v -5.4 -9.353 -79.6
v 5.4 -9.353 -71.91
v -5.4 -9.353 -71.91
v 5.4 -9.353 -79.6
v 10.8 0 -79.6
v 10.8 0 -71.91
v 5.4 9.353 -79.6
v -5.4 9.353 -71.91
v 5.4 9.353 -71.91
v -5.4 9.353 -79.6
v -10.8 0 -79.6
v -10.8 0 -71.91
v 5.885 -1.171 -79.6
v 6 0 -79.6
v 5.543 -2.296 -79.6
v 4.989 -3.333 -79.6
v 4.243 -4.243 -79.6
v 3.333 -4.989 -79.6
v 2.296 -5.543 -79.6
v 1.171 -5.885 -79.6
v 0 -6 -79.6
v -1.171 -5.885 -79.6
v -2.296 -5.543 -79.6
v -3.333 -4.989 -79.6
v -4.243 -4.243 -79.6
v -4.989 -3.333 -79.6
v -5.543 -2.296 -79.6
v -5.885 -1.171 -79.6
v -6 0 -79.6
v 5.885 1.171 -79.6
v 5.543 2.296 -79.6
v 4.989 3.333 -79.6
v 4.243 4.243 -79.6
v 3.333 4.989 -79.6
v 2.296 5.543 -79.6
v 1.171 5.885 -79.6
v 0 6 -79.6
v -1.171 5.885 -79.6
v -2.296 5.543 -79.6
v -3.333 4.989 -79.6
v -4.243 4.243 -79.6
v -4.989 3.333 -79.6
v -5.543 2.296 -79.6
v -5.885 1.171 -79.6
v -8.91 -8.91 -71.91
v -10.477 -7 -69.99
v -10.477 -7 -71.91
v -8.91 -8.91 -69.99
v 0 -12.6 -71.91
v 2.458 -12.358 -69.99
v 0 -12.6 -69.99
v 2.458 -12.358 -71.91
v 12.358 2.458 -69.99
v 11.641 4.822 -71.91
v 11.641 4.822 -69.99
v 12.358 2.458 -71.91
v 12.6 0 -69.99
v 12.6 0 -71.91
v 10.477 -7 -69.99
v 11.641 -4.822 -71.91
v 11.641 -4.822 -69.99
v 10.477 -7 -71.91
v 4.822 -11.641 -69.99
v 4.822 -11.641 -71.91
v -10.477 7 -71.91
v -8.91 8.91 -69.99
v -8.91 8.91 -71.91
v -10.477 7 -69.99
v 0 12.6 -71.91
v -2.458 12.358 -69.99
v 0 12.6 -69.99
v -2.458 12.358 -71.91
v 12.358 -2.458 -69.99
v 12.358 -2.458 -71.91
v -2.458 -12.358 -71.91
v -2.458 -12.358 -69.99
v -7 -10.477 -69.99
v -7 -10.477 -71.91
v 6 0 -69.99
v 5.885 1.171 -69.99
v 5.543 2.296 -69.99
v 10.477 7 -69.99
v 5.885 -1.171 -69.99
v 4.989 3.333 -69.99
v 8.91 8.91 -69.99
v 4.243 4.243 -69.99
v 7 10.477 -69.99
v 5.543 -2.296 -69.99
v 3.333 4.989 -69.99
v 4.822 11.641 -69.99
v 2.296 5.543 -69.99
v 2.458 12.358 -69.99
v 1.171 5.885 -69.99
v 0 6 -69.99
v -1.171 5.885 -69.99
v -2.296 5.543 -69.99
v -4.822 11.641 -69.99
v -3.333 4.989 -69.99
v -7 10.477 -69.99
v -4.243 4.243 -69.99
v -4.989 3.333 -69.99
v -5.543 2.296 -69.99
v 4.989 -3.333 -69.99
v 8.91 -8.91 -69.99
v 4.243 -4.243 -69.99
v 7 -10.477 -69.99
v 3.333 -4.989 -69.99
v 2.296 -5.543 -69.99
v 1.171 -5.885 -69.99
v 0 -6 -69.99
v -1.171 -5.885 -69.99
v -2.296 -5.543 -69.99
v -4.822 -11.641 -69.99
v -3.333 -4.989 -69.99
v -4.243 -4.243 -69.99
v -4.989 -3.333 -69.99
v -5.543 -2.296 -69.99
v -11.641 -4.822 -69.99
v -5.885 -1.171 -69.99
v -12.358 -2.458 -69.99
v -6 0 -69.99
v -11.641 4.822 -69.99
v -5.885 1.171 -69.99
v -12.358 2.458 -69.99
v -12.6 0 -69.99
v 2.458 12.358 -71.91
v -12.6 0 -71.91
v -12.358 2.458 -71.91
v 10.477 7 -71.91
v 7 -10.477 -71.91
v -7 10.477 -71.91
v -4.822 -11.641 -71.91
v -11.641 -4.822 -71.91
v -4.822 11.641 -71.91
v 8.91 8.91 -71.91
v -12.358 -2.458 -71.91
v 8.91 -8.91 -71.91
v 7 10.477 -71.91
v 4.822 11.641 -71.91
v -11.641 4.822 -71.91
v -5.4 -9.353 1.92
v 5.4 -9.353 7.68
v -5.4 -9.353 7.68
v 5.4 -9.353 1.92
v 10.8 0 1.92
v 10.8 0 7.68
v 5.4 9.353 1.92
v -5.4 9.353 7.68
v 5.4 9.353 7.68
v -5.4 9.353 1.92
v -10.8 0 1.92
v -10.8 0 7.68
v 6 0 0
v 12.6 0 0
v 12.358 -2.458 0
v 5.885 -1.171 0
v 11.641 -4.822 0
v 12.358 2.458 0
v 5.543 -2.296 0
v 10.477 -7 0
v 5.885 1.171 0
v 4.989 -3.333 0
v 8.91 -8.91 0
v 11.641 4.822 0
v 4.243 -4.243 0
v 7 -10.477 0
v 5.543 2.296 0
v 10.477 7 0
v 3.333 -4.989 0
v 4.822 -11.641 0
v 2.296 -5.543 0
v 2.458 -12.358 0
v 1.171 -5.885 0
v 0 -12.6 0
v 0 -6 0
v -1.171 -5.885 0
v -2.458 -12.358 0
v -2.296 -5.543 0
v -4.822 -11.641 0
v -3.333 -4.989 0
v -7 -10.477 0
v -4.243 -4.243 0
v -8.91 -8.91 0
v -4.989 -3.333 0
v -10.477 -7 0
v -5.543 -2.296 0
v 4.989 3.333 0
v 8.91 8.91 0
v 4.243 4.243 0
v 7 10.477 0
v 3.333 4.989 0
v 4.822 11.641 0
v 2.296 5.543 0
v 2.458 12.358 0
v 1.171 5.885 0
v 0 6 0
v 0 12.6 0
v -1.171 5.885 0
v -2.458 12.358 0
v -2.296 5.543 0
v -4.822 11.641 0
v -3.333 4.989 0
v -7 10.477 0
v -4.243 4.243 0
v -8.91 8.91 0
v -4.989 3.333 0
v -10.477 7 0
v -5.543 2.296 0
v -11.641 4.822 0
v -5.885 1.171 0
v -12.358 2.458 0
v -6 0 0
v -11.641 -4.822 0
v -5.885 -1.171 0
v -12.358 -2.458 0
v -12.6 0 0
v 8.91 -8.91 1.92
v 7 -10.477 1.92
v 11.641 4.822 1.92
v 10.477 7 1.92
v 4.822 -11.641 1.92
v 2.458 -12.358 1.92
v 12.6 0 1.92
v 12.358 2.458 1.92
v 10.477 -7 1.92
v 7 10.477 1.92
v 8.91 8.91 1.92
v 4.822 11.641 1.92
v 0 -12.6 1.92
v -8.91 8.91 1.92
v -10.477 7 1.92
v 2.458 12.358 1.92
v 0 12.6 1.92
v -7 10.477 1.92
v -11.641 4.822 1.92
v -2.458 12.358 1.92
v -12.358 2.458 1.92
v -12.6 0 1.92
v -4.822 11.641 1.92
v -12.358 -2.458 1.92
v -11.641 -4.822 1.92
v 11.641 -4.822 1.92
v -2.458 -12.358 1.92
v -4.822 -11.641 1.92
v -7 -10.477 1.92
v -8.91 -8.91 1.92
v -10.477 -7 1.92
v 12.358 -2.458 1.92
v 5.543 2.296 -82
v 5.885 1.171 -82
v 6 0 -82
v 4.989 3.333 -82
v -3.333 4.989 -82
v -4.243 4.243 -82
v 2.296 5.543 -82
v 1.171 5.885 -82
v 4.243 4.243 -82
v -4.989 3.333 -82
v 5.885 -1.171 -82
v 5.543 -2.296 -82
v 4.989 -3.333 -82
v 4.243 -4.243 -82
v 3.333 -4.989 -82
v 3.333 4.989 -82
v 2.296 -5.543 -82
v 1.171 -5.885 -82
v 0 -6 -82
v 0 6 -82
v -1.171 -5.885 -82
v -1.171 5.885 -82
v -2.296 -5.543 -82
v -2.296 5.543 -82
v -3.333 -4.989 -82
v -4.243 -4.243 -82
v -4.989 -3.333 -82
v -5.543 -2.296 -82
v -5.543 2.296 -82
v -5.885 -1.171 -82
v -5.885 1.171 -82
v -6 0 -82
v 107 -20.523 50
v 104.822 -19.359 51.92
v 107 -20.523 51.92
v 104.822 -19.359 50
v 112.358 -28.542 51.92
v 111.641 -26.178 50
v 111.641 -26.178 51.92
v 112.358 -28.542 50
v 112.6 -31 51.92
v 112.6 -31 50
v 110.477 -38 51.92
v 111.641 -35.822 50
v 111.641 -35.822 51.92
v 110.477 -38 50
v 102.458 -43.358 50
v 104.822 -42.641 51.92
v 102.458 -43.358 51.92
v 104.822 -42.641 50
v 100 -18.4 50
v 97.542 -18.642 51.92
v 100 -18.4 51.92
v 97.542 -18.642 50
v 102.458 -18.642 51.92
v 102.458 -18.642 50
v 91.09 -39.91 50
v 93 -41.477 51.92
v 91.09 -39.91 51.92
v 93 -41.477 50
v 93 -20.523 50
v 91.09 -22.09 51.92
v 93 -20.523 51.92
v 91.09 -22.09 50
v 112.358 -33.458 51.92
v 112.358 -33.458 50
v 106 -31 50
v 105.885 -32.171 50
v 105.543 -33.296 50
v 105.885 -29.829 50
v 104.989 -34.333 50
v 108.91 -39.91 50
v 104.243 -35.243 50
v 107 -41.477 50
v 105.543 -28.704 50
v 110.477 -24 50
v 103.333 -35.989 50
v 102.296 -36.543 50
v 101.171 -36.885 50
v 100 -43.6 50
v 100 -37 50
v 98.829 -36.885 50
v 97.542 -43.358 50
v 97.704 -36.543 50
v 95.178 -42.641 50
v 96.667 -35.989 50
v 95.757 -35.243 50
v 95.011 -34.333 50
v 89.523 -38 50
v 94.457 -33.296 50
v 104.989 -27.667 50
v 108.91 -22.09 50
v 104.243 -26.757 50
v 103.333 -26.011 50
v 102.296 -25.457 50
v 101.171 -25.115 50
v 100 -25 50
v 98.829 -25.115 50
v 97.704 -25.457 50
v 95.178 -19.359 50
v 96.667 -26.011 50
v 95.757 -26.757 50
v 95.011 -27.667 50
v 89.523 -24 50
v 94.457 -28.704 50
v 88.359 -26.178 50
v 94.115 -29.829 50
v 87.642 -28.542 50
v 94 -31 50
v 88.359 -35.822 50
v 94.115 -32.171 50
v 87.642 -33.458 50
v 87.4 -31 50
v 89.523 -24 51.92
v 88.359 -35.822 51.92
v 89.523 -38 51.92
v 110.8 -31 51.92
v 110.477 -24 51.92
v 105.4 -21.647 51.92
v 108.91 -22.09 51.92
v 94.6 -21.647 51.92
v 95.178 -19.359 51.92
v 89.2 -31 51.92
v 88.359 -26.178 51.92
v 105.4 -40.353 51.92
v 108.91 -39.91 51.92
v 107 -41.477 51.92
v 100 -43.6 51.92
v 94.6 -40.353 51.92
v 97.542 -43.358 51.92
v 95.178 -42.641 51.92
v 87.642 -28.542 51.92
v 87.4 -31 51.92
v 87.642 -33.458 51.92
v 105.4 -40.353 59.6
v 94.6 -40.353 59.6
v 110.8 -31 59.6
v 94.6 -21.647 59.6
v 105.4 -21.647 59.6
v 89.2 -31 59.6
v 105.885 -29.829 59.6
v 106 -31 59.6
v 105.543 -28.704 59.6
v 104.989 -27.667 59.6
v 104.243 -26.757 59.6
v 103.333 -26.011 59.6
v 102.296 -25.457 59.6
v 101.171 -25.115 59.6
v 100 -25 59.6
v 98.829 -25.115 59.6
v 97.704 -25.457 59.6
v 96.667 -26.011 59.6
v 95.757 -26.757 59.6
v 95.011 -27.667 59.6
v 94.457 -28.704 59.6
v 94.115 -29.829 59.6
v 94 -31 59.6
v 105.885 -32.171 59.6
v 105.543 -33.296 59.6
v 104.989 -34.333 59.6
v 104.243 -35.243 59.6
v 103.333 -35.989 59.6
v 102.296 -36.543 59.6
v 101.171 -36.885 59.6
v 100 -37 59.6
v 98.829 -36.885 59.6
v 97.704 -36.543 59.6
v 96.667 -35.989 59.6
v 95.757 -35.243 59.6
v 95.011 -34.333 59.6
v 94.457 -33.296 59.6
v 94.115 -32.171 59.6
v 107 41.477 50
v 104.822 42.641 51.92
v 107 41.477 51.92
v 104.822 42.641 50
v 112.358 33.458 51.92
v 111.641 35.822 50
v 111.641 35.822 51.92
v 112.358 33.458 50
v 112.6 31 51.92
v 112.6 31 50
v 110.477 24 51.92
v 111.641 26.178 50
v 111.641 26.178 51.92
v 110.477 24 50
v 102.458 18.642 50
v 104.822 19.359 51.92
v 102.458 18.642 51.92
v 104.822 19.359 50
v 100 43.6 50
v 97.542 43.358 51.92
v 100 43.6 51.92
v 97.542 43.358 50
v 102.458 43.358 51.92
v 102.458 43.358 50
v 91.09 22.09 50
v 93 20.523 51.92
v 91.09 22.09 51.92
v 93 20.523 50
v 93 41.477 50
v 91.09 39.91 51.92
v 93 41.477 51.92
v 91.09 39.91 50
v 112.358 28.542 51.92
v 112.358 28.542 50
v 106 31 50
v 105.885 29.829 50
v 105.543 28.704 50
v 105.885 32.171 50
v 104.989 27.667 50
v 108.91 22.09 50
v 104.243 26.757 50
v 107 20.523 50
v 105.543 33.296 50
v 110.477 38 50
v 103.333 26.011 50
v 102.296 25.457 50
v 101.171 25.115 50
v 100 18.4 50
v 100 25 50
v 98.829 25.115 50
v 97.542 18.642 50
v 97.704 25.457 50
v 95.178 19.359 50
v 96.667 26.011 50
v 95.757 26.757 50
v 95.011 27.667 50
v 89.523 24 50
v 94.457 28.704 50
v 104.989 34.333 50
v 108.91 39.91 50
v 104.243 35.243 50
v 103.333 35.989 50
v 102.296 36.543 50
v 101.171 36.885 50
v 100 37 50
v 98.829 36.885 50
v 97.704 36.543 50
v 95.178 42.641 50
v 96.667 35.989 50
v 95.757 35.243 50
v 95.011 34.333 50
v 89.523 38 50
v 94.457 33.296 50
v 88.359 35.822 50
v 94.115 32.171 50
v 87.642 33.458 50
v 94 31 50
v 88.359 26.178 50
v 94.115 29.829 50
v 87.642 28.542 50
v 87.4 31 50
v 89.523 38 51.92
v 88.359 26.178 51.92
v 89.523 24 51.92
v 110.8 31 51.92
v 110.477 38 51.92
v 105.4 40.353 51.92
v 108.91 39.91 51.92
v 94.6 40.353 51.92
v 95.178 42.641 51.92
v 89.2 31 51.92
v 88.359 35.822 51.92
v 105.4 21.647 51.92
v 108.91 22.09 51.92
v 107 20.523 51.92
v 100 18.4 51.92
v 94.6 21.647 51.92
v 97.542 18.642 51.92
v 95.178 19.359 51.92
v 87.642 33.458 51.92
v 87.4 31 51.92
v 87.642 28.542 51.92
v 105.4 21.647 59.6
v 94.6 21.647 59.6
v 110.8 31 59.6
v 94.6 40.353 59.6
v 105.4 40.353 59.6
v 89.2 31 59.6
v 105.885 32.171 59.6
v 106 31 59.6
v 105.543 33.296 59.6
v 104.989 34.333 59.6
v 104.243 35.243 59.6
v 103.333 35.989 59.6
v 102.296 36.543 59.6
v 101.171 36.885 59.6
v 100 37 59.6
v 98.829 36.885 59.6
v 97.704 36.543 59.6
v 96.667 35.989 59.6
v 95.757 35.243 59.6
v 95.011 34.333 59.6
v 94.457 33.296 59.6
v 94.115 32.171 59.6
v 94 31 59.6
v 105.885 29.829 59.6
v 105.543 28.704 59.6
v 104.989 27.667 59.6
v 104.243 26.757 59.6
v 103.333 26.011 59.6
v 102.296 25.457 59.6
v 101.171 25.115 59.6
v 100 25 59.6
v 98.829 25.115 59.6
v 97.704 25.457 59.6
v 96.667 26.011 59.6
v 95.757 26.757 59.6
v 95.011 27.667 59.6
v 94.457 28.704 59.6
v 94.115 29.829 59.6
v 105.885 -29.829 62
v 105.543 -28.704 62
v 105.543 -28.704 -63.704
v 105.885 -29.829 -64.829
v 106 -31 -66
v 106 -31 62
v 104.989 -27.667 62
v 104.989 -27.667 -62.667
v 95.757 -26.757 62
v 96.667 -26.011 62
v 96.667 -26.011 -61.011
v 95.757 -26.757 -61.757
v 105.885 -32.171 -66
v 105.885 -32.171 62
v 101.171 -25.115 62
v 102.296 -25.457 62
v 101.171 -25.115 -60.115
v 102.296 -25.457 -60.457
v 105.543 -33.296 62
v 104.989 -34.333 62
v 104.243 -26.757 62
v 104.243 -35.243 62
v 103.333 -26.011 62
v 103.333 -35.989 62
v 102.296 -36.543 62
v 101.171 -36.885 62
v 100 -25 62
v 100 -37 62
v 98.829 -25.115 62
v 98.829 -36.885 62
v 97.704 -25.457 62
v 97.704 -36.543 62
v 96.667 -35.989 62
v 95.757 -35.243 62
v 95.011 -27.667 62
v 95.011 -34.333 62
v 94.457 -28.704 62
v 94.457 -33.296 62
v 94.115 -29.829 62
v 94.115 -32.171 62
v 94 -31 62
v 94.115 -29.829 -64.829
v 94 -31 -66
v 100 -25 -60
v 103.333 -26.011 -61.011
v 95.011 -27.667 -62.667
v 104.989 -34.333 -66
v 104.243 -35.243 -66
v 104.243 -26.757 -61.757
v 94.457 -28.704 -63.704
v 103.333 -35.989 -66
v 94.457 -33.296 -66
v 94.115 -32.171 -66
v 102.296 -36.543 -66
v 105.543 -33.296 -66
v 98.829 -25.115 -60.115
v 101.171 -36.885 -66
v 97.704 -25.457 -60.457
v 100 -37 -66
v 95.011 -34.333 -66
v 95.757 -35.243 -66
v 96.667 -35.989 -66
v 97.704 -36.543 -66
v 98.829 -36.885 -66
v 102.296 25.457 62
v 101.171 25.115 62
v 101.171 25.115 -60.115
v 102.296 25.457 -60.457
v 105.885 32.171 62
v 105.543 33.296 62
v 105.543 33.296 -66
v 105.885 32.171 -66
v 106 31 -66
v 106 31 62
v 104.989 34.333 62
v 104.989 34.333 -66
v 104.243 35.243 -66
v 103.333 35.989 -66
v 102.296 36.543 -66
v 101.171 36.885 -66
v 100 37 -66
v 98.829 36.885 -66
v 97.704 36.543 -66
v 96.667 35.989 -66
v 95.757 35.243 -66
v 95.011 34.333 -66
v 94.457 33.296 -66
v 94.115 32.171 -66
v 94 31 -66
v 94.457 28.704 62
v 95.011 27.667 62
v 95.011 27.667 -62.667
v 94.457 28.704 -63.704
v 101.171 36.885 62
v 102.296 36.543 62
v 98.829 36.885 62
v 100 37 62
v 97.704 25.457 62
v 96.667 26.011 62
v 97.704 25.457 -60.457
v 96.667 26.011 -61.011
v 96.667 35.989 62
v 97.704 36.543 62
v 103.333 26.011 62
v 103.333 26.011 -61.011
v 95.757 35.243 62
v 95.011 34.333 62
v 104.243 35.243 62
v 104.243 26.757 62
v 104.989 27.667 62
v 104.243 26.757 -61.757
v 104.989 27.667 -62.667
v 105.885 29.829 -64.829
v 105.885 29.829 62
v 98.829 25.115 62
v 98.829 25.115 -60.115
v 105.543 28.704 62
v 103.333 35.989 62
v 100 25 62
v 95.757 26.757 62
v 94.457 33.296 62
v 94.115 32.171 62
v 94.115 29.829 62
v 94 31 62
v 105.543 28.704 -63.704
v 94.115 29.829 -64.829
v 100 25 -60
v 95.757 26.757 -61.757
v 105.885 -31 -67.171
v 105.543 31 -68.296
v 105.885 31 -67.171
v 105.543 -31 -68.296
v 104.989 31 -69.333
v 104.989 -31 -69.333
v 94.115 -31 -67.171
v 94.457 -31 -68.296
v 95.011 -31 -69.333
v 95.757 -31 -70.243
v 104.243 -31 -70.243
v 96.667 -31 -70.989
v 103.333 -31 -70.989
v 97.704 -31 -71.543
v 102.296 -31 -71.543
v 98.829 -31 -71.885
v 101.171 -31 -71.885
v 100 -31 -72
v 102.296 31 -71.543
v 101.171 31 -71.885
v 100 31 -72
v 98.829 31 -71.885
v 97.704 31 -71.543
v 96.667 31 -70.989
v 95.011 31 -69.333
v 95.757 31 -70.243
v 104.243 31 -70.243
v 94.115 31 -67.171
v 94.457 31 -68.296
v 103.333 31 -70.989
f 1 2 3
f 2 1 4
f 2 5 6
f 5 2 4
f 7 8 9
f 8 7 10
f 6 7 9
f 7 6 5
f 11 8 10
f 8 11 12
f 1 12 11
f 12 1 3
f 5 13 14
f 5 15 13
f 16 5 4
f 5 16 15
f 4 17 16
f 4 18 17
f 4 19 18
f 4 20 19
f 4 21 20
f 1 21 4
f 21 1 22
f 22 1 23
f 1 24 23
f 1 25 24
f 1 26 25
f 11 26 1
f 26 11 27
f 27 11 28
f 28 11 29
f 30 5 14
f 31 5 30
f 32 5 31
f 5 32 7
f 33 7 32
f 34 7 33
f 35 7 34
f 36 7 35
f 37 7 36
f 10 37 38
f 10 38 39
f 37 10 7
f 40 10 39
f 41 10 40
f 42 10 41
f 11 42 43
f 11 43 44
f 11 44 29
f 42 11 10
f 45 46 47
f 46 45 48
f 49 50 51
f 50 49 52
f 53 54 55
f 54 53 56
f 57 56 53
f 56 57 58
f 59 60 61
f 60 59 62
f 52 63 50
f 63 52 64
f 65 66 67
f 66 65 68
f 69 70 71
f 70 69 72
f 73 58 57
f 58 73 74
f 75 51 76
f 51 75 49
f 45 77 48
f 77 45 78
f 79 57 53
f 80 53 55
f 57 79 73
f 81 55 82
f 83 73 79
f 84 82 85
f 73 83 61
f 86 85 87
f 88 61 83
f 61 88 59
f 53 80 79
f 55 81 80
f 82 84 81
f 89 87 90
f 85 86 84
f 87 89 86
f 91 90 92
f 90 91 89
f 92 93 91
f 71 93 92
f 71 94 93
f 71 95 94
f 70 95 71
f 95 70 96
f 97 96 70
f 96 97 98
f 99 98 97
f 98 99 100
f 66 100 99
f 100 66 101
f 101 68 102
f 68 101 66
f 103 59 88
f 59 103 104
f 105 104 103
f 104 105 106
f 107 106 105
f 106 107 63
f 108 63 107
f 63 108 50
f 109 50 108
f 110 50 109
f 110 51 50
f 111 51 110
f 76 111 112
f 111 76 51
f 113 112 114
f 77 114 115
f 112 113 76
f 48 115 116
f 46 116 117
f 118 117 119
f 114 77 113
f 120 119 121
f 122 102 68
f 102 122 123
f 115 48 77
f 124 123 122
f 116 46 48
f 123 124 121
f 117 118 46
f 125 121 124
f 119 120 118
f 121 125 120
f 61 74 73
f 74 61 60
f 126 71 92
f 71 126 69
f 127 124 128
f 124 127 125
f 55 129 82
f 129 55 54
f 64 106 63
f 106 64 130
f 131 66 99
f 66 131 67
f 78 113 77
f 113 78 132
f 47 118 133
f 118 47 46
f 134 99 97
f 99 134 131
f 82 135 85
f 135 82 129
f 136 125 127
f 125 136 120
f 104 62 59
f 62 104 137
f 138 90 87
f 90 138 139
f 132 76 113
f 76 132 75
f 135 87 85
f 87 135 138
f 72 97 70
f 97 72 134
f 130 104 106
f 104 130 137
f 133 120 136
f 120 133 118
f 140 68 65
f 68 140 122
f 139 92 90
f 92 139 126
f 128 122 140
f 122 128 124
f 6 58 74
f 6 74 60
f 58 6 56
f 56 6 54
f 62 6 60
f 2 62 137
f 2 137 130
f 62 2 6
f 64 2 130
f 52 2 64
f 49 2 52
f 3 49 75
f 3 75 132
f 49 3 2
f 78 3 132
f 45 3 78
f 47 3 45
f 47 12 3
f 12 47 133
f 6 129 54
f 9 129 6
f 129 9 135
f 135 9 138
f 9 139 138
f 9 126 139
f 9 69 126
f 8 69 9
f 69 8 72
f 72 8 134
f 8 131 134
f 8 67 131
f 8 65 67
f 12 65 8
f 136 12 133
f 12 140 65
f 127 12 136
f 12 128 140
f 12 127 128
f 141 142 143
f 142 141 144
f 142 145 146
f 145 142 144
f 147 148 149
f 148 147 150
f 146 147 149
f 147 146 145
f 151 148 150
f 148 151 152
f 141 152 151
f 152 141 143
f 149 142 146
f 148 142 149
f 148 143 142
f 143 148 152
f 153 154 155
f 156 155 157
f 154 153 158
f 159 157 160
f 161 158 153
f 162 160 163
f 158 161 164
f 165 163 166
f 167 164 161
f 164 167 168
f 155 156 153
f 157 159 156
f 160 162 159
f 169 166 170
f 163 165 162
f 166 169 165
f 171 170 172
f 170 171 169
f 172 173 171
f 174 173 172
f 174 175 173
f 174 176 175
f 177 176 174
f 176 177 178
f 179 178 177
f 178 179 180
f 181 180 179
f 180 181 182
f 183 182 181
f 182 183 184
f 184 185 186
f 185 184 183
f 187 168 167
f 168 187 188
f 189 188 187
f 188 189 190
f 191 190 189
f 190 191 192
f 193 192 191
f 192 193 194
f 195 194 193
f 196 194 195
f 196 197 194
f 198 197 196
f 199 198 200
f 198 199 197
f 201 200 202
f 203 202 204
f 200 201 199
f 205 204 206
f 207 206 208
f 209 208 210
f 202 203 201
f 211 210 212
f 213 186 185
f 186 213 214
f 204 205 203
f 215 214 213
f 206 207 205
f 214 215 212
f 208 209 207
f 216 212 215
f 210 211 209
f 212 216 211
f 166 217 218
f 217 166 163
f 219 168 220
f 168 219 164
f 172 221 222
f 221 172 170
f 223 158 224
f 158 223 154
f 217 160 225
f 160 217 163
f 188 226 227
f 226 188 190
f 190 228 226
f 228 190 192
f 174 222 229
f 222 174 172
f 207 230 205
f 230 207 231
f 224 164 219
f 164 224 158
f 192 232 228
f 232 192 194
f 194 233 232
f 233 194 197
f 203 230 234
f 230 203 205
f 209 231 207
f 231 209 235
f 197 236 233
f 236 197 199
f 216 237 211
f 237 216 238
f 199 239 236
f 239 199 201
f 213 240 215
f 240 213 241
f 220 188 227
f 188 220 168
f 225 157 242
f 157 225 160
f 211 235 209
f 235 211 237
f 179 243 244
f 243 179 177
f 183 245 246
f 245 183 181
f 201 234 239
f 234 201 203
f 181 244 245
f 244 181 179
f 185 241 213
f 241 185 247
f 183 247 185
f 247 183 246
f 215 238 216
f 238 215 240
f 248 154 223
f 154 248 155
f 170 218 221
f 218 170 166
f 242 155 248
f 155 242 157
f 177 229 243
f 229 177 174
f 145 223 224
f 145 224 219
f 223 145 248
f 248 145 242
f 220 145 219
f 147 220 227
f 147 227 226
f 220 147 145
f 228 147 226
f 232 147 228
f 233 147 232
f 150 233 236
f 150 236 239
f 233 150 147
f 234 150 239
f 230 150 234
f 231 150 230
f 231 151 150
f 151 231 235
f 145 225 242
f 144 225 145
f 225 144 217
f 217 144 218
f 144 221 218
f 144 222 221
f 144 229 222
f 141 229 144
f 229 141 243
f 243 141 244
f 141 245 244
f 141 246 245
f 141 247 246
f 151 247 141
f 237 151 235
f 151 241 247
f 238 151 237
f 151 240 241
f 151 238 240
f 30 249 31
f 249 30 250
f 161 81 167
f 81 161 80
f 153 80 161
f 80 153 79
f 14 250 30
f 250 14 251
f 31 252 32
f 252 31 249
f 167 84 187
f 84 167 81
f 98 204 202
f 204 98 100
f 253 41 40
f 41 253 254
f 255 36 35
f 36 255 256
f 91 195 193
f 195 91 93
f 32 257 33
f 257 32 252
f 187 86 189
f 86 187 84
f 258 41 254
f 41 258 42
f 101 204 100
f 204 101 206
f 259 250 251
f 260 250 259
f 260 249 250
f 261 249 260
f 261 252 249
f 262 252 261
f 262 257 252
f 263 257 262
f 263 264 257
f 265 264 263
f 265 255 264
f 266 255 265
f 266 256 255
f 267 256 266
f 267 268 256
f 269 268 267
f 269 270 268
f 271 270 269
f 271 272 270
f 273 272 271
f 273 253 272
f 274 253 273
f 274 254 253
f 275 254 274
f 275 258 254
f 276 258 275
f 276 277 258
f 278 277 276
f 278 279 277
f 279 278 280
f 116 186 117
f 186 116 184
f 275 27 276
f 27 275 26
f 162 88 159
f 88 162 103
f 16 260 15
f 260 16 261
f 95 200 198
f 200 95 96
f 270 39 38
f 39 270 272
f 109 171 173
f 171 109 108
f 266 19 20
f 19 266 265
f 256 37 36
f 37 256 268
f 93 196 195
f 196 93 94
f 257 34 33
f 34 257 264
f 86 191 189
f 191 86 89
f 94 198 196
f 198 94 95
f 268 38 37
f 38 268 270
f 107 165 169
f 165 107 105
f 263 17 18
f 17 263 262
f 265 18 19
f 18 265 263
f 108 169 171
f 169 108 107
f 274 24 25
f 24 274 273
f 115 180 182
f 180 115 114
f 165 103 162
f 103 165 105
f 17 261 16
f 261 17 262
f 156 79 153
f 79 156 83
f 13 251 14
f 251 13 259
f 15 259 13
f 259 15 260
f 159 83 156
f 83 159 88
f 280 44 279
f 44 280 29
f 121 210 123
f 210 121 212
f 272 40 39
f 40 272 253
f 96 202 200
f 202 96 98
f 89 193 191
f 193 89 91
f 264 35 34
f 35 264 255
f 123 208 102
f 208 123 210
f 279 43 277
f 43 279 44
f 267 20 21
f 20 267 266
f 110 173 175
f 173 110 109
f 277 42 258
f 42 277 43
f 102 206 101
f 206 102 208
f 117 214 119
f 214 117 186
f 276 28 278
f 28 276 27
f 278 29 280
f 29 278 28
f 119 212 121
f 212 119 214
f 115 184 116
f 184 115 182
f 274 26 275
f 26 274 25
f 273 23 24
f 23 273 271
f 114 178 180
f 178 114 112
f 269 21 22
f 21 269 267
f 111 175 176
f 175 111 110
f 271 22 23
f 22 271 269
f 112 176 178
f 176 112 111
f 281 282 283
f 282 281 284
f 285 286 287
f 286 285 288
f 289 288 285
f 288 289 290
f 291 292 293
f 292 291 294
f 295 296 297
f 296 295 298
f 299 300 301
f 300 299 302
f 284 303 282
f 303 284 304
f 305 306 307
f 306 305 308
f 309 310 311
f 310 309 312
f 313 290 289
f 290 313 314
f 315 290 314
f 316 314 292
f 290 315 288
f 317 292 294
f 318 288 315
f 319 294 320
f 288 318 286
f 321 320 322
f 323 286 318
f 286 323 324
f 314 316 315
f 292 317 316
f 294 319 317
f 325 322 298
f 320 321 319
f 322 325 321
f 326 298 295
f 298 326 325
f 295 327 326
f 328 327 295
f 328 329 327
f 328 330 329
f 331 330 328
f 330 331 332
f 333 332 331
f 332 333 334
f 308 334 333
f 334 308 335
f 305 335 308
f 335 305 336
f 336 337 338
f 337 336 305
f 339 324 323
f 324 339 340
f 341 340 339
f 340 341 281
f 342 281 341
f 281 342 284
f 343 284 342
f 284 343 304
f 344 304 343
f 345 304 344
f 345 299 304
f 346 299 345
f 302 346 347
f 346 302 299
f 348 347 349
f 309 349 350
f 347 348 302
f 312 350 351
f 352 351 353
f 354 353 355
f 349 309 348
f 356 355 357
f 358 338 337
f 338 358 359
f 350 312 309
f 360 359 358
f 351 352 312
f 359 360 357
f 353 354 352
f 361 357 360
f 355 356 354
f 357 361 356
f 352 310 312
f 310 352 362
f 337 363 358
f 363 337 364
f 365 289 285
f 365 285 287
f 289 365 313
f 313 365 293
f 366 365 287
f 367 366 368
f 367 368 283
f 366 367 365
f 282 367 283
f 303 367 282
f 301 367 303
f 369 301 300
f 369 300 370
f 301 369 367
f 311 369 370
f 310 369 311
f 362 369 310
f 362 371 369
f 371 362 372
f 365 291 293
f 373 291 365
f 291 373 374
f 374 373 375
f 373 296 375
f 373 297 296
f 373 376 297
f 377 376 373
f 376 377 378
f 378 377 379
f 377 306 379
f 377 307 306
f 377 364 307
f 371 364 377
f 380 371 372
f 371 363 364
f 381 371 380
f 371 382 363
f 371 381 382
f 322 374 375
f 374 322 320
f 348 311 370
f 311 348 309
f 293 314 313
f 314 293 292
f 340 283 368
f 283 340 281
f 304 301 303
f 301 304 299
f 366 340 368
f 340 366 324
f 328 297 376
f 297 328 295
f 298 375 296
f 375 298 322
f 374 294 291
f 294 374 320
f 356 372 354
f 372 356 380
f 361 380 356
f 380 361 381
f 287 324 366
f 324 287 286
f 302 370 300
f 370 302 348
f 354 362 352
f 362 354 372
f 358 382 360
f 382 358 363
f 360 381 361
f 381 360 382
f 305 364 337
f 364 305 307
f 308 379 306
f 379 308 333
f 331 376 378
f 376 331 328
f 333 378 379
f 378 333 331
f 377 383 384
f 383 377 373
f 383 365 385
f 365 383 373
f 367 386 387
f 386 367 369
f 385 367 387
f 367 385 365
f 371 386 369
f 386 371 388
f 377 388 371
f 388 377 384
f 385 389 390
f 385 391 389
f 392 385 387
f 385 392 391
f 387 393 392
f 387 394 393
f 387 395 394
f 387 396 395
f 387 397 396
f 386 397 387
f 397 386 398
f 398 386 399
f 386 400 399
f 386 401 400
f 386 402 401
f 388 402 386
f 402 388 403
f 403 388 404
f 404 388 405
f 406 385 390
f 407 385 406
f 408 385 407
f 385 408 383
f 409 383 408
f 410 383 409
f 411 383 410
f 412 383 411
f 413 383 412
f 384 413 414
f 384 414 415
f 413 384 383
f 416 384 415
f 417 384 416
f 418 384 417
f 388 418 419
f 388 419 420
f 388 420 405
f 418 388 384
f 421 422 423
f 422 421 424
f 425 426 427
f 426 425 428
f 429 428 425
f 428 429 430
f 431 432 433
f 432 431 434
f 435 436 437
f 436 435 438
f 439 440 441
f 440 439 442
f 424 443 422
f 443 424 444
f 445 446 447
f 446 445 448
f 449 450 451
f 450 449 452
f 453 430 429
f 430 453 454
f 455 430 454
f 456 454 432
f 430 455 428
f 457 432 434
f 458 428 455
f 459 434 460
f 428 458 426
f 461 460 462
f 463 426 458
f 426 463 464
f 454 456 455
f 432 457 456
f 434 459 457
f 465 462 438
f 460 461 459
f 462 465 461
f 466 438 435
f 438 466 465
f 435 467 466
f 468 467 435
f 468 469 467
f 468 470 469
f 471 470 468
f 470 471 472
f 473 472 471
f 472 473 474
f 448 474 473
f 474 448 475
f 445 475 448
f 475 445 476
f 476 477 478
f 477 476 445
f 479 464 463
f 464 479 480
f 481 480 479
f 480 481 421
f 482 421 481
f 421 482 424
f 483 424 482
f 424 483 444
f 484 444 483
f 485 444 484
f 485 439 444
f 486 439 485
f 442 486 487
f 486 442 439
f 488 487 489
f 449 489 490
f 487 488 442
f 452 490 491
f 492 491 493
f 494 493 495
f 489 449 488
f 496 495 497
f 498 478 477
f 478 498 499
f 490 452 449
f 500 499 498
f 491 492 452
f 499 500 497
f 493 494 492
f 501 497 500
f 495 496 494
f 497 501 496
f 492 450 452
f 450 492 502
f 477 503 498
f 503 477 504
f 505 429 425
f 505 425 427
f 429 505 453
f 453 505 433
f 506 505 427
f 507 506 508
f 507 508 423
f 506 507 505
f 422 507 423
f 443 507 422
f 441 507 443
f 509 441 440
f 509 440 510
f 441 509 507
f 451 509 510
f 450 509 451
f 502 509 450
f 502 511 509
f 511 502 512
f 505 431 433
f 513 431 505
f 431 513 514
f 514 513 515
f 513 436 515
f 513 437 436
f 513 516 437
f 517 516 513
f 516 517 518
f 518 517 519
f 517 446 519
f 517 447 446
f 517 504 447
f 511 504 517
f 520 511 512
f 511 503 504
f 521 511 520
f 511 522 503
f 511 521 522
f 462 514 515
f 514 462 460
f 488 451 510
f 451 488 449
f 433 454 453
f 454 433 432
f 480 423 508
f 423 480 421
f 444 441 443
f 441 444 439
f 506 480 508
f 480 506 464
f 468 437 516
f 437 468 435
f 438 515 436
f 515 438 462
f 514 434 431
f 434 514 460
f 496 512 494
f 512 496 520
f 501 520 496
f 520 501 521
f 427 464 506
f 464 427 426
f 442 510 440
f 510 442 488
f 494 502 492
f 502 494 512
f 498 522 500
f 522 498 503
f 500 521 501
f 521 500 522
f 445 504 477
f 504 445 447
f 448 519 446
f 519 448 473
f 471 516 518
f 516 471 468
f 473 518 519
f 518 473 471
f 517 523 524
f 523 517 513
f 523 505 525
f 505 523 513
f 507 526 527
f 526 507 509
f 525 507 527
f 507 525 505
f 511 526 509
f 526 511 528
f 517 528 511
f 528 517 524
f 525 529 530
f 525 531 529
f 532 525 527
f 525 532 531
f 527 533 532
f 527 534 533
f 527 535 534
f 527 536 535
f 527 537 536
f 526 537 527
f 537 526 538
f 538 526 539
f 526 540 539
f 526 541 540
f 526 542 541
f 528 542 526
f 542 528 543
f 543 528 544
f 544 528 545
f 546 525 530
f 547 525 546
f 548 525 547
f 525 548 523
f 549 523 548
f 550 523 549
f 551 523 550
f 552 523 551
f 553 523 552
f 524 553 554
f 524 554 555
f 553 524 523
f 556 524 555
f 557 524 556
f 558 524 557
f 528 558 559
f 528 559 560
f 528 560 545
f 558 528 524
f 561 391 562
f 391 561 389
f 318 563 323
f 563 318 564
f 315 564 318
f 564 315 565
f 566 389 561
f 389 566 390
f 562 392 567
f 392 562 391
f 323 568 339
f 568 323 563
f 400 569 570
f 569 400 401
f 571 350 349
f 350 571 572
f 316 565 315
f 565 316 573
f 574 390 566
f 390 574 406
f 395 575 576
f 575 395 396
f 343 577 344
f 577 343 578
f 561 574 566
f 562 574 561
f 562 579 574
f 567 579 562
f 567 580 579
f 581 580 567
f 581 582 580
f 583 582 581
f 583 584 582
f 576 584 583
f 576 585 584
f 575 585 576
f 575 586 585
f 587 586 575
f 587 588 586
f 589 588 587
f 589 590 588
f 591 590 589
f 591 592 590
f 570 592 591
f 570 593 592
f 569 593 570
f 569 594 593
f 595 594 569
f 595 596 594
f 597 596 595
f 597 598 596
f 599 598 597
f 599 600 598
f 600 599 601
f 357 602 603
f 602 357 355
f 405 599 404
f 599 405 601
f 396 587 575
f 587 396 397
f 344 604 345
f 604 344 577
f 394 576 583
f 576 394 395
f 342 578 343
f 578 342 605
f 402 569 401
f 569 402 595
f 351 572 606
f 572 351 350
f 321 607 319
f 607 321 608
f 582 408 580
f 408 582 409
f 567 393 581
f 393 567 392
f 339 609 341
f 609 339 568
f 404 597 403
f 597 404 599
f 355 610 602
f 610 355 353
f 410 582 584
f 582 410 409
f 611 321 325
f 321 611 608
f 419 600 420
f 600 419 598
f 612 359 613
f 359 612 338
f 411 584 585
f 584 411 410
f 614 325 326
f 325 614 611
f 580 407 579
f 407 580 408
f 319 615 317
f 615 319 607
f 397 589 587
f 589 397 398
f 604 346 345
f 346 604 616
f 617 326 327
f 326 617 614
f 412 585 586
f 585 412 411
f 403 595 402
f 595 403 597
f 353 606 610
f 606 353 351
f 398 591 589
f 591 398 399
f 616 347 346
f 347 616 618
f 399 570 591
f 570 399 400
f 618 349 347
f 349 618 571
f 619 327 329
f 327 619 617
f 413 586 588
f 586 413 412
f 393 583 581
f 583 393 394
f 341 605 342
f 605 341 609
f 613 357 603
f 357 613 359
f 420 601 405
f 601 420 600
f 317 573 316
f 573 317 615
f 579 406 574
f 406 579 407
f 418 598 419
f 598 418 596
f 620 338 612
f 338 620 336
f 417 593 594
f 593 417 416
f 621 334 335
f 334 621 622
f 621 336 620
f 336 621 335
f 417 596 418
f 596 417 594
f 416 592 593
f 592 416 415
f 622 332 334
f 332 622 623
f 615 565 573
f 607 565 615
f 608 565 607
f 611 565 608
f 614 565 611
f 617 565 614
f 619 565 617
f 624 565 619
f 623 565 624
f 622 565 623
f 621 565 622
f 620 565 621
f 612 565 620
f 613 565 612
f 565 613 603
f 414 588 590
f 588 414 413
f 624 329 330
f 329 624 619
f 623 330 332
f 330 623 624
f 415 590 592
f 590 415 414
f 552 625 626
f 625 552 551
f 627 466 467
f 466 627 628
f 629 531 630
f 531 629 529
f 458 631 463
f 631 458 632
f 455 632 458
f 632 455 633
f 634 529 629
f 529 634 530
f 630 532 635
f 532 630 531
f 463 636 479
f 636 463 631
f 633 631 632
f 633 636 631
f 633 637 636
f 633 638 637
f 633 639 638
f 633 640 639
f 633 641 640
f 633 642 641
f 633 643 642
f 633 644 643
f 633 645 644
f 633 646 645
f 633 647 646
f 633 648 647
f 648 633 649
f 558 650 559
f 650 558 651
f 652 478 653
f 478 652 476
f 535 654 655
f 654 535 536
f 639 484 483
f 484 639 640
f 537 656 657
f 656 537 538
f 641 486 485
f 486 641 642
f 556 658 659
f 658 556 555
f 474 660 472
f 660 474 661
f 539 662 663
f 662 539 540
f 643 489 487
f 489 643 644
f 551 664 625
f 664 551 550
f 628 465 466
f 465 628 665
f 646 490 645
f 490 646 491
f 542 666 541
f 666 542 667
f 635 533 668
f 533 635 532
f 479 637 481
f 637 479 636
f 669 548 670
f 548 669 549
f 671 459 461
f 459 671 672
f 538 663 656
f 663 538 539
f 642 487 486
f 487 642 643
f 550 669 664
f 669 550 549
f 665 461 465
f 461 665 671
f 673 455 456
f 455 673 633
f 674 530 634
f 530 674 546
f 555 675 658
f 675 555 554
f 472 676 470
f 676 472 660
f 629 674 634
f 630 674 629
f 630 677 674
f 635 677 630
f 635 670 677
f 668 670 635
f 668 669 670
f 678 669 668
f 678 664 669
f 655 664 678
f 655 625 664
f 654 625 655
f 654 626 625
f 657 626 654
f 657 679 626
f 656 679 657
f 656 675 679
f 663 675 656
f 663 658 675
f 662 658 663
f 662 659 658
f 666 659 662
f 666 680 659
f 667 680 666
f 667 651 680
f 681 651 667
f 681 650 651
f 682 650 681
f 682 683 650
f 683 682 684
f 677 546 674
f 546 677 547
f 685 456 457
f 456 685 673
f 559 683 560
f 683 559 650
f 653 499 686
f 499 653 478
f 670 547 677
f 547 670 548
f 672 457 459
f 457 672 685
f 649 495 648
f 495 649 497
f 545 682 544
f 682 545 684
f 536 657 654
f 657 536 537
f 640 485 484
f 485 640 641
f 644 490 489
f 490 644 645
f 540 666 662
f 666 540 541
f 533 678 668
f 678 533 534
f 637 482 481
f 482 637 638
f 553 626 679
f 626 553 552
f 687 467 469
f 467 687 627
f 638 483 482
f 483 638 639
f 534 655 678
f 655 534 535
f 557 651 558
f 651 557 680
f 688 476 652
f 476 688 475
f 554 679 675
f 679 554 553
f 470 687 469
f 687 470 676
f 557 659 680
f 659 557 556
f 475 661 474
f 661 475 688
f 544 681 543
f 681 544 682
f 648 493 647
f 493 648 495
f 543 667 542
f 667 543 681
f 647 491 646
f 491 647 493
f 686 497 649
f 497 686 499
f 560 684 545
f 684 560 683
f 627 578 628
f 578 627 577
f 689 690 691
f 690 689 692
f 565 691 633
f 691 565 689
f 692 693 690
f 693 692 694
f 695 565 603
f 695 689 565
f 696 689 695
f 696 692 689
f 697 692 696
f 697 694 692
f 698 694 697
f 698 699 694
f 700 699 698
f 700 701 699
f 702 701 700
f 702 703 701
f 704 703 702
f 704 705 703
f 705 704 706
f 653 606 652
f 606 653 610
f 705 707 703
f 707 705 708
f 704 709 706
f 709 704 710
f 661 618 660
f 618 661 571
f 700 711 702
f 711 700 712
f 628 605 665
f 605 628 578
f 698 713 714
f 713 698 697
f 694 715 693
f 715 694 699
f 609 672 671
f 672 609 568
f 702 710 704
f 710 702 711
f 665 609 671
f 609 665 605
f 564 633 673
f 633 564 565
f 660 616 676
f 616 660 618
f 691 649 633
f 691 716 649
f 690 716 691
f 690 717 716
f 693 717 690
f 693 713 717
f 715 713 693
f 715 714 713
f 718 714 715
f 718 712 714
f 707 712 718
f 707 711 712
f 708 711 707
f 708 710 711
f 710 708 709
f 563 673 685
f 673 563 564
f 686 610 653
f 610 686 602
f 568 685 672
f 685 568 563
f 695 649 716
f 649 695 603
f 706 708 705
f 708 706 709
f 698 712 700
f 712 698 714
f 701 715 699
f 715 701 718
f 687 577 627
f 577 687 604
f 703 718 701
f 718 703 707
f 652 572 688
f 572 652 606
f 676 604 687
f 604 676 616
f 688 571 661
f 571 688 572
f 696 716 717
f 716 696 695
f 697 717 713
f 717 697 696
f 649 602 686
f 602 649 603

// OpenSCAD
/*
 * Offroad Adventure Trailer - Fastener Display Models
 *
 * Visual bolts, nuts and square U-bolts for the master assembly: they
 * show HOW every joint is mounted (which holes get through-bolts,
 * where the U-bolt clamps sit). Display geometry only — no threads,
 * approximate head/nut sizes. The engineering lives elsewhere:
 * preload/friction budget in scripts/beam_check.py (check_v_joints,
 * check_bolts), quantities in MATERIALS.md. Every through-bolt runs on
 * an internal crush sleeve (not drawn — hidden inside the tube).
 */

// Hex-head through-bolt + washer + nut for a clamped stack:
// head sits on top at z=0, shank passes DOWN through `grip`
// (= the stack thickness), washer+nut below.
module stack_bolt(d = 10, grip = 70) {
    color("SlateGray") {
        cylinder(d = 1.8 * d, h = 0.64 * d, $fn = 6);          // head
        cylinder(d = 2.1 * d, h = 0.16 * d, $fn = 32);         // washer
        translate([0, 0, -grip - d])
            cylinder(d = d, h = grip + d, $fn = 32);           // shank
        translate([0, 0, -grip - 0.8 * d]) {
            cylinder(d = 1.8 * d, h = 0.8 * d, $fn = 6);       // nut
            translate([0, 0, 0.8 * d - 0.16 * d + 0.01])
                cylinder(d = 2.1 * d, h = 0.16 * d, $fn = 32); // washer
        }
    }
}

// Square U-bolt (fyrkantbygel) wrapping a tube that runs along local X:
// bottom bar under the tube at z=drop, legs rise beside the tube up to
// z=rise where the washers+nuts sit (on top of the clamped member).
module square_u_bolt(d = 12, tube_w = 50, clear = 6, drop = -66, rise = 50) {
    w = tube_w / 2 + clear;
    color("SlateGray") {
        for (s = [-1, 1]) {
            translate([0, s * w, drop])
                cylinder(d = d, h = rise - drop + d, $fn = 32);   // leg
            translate([0, s * w, rise]) {
                cylinder(d = 2.1 * d, h = 0.16 * d, $fn = 32);    // washer
                cylinder(d = 1.8 * d, h = 0.8 * d, $fn = 6);      // nut
            }
        }
        translate([0, -w, drop])
            rotate([-90, 0, 0])
                cylinder(d = d, h = 2 * w, $fn = 32);             // bottom bar
    }
}

// Standalone preview
stack_bolt(12, 70);
translate([100, 0, 0]) square_u_bolt();
